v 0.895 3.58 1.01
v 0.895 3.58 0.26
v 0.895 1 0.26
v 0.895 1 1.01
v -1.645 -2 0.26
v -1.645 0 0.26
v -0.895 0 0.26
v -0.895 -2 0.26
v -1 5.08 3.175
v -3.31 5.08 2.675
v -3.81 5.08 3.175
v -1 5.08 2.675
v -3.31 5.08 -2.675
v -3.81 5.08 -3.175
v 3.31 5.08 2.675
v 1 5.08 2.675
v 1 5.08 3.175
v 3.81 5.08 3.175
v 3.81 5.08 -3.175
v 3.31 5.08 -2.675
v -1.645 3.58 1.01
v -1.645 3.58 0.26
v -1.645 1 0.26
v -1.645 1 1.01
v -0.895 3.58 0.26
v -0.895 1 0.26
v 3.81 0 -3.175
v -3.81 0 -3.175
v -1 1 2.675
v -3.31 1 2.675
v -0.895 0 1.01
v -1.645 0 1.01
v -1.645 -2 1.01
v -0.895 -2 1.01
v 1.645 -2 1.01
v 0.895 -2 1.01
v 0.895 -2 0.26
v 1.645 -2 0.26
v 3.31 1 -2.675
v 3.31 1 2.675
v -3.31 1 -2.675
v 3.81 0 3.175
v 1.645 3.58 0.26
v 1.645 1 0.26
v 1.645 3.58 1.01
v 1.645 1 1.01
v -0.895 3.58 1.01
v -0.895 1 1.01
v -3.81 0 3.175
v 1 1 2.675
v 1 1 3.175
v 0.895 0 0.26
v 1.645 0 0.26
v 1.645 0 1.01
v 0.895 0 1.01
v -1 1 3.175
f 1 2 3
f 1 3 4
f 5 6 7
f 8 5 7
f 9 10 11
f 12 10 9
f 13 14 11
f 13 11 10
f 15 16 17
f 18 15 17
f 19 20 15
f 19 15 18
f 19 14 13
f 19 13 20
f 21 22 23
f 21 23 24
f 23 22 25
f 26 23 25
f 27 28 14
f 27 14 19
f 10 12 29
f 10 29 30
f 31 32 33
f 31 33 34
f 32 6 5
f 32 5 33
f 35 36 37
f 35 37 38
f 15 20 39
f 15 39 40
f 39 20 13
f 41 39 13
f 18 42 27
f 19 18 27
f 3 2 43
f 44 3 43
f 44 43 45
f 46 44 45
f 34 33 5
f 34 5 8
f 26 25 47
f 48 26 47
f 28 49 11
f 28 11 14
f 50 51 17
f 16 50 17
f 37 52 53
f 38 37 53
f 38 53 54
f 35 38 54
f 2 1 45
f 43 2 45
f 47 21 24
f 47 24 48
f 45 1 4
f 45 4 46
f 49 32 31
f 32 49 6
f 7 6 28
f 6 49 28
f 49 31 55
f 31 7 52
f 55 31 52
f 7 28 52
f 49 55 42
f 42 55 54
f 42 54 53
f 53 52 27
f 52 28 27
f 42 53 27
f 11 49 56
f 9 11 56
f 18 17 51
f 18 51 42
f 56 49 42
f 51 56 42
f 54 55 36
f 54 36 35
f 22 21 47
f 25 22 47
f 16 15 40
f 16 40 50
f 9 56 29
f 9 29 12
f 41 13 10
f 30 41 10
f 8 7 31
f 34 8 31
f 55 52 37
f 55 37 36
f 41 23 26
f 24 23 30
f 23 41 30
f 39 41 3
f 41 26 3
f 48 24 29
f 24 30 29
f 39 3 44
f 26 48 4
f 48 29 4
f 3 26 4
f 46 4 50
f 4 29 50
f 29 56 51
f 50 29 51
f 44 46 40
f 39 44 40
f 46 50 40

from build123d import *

# Parameters (mm, degrees)
SKETCH_1_W           = 7.62
SKETCH_1_H           = 6.35
EXTRUDE_1_DEPTH      = 5.08
SKETCH_2_W           = 6.62
SKETCH_2_H           = 5.35
CUT_EXTRUDE_1_DEPTH  = 4.08
SKETCH_3_W           = 2
SKETCH_3_H           = 4.08
CUT_EXTRUDE_2_DEPTH  = 1
EXTRUDE_2_DEPTH      = 2
EXTRUDE_2_DEPTH_BACK = 3.58
SKETCH_4_W           = 0.75
SKETCH_4_H           = 0.75


with BuildPart() as part:
    # 草图1 → 拉伸1 (new body)
    with BuildSketch(Plane(origin=(0, 0, 0), x_dir=(1, 0, 0), z_dir=(0, 1, 0))):
        Rectangle(SKETCH_1_W, SKETCH_1_H)
    extrude(amount=EXTRUDE_1_DEPTH)

    # 草图2 → 切除-拉伸1 (cut)
    with BuildSketch(Plane(origin=(0, 5.08, 0), x_dir=(-1, 0, 0), z_dir=(0, 1, 0))):
        Rectangle(SKETCH_2_W, SKETCH_2_H)
    extrude(amount=-CUT_EXTRUDE_1_DEPTH, mode=Mode.SUBTRACT)

    # 草图3 → 切除-拉伸2 (cut)
    with BuildSketch(Plane.XY.offset(3.175)):
        with Locations((0, 3.04)):
            Rectangle(SKETCH_3_W, SKETCH_3_H)
    extrude(amount=-CUT_EXTRUDE_2_DEPTH, mode=Mode.SUBTRACT)

    # 草图4 → 拉伸2 (add, two sides: drawn at the far end of the back side and taken through both)
    with BuildSketch(Plane.XZ.offset(-EXTRUDE_2_DEPTH_BACK)):
        with Locations((-1.27, 0.635)):
            Rectangle(SKETCH_4_W, SKETCH_4_H)
        with Locations((1.27, 0.635)):
            Rectangle(SKETCH_4_W, SKETCH_4_H)
    extrude(amount=EXTRUDE_2_DEPTH + EXTRUDE_2_DEPTH_BACK)


solid = part.part
